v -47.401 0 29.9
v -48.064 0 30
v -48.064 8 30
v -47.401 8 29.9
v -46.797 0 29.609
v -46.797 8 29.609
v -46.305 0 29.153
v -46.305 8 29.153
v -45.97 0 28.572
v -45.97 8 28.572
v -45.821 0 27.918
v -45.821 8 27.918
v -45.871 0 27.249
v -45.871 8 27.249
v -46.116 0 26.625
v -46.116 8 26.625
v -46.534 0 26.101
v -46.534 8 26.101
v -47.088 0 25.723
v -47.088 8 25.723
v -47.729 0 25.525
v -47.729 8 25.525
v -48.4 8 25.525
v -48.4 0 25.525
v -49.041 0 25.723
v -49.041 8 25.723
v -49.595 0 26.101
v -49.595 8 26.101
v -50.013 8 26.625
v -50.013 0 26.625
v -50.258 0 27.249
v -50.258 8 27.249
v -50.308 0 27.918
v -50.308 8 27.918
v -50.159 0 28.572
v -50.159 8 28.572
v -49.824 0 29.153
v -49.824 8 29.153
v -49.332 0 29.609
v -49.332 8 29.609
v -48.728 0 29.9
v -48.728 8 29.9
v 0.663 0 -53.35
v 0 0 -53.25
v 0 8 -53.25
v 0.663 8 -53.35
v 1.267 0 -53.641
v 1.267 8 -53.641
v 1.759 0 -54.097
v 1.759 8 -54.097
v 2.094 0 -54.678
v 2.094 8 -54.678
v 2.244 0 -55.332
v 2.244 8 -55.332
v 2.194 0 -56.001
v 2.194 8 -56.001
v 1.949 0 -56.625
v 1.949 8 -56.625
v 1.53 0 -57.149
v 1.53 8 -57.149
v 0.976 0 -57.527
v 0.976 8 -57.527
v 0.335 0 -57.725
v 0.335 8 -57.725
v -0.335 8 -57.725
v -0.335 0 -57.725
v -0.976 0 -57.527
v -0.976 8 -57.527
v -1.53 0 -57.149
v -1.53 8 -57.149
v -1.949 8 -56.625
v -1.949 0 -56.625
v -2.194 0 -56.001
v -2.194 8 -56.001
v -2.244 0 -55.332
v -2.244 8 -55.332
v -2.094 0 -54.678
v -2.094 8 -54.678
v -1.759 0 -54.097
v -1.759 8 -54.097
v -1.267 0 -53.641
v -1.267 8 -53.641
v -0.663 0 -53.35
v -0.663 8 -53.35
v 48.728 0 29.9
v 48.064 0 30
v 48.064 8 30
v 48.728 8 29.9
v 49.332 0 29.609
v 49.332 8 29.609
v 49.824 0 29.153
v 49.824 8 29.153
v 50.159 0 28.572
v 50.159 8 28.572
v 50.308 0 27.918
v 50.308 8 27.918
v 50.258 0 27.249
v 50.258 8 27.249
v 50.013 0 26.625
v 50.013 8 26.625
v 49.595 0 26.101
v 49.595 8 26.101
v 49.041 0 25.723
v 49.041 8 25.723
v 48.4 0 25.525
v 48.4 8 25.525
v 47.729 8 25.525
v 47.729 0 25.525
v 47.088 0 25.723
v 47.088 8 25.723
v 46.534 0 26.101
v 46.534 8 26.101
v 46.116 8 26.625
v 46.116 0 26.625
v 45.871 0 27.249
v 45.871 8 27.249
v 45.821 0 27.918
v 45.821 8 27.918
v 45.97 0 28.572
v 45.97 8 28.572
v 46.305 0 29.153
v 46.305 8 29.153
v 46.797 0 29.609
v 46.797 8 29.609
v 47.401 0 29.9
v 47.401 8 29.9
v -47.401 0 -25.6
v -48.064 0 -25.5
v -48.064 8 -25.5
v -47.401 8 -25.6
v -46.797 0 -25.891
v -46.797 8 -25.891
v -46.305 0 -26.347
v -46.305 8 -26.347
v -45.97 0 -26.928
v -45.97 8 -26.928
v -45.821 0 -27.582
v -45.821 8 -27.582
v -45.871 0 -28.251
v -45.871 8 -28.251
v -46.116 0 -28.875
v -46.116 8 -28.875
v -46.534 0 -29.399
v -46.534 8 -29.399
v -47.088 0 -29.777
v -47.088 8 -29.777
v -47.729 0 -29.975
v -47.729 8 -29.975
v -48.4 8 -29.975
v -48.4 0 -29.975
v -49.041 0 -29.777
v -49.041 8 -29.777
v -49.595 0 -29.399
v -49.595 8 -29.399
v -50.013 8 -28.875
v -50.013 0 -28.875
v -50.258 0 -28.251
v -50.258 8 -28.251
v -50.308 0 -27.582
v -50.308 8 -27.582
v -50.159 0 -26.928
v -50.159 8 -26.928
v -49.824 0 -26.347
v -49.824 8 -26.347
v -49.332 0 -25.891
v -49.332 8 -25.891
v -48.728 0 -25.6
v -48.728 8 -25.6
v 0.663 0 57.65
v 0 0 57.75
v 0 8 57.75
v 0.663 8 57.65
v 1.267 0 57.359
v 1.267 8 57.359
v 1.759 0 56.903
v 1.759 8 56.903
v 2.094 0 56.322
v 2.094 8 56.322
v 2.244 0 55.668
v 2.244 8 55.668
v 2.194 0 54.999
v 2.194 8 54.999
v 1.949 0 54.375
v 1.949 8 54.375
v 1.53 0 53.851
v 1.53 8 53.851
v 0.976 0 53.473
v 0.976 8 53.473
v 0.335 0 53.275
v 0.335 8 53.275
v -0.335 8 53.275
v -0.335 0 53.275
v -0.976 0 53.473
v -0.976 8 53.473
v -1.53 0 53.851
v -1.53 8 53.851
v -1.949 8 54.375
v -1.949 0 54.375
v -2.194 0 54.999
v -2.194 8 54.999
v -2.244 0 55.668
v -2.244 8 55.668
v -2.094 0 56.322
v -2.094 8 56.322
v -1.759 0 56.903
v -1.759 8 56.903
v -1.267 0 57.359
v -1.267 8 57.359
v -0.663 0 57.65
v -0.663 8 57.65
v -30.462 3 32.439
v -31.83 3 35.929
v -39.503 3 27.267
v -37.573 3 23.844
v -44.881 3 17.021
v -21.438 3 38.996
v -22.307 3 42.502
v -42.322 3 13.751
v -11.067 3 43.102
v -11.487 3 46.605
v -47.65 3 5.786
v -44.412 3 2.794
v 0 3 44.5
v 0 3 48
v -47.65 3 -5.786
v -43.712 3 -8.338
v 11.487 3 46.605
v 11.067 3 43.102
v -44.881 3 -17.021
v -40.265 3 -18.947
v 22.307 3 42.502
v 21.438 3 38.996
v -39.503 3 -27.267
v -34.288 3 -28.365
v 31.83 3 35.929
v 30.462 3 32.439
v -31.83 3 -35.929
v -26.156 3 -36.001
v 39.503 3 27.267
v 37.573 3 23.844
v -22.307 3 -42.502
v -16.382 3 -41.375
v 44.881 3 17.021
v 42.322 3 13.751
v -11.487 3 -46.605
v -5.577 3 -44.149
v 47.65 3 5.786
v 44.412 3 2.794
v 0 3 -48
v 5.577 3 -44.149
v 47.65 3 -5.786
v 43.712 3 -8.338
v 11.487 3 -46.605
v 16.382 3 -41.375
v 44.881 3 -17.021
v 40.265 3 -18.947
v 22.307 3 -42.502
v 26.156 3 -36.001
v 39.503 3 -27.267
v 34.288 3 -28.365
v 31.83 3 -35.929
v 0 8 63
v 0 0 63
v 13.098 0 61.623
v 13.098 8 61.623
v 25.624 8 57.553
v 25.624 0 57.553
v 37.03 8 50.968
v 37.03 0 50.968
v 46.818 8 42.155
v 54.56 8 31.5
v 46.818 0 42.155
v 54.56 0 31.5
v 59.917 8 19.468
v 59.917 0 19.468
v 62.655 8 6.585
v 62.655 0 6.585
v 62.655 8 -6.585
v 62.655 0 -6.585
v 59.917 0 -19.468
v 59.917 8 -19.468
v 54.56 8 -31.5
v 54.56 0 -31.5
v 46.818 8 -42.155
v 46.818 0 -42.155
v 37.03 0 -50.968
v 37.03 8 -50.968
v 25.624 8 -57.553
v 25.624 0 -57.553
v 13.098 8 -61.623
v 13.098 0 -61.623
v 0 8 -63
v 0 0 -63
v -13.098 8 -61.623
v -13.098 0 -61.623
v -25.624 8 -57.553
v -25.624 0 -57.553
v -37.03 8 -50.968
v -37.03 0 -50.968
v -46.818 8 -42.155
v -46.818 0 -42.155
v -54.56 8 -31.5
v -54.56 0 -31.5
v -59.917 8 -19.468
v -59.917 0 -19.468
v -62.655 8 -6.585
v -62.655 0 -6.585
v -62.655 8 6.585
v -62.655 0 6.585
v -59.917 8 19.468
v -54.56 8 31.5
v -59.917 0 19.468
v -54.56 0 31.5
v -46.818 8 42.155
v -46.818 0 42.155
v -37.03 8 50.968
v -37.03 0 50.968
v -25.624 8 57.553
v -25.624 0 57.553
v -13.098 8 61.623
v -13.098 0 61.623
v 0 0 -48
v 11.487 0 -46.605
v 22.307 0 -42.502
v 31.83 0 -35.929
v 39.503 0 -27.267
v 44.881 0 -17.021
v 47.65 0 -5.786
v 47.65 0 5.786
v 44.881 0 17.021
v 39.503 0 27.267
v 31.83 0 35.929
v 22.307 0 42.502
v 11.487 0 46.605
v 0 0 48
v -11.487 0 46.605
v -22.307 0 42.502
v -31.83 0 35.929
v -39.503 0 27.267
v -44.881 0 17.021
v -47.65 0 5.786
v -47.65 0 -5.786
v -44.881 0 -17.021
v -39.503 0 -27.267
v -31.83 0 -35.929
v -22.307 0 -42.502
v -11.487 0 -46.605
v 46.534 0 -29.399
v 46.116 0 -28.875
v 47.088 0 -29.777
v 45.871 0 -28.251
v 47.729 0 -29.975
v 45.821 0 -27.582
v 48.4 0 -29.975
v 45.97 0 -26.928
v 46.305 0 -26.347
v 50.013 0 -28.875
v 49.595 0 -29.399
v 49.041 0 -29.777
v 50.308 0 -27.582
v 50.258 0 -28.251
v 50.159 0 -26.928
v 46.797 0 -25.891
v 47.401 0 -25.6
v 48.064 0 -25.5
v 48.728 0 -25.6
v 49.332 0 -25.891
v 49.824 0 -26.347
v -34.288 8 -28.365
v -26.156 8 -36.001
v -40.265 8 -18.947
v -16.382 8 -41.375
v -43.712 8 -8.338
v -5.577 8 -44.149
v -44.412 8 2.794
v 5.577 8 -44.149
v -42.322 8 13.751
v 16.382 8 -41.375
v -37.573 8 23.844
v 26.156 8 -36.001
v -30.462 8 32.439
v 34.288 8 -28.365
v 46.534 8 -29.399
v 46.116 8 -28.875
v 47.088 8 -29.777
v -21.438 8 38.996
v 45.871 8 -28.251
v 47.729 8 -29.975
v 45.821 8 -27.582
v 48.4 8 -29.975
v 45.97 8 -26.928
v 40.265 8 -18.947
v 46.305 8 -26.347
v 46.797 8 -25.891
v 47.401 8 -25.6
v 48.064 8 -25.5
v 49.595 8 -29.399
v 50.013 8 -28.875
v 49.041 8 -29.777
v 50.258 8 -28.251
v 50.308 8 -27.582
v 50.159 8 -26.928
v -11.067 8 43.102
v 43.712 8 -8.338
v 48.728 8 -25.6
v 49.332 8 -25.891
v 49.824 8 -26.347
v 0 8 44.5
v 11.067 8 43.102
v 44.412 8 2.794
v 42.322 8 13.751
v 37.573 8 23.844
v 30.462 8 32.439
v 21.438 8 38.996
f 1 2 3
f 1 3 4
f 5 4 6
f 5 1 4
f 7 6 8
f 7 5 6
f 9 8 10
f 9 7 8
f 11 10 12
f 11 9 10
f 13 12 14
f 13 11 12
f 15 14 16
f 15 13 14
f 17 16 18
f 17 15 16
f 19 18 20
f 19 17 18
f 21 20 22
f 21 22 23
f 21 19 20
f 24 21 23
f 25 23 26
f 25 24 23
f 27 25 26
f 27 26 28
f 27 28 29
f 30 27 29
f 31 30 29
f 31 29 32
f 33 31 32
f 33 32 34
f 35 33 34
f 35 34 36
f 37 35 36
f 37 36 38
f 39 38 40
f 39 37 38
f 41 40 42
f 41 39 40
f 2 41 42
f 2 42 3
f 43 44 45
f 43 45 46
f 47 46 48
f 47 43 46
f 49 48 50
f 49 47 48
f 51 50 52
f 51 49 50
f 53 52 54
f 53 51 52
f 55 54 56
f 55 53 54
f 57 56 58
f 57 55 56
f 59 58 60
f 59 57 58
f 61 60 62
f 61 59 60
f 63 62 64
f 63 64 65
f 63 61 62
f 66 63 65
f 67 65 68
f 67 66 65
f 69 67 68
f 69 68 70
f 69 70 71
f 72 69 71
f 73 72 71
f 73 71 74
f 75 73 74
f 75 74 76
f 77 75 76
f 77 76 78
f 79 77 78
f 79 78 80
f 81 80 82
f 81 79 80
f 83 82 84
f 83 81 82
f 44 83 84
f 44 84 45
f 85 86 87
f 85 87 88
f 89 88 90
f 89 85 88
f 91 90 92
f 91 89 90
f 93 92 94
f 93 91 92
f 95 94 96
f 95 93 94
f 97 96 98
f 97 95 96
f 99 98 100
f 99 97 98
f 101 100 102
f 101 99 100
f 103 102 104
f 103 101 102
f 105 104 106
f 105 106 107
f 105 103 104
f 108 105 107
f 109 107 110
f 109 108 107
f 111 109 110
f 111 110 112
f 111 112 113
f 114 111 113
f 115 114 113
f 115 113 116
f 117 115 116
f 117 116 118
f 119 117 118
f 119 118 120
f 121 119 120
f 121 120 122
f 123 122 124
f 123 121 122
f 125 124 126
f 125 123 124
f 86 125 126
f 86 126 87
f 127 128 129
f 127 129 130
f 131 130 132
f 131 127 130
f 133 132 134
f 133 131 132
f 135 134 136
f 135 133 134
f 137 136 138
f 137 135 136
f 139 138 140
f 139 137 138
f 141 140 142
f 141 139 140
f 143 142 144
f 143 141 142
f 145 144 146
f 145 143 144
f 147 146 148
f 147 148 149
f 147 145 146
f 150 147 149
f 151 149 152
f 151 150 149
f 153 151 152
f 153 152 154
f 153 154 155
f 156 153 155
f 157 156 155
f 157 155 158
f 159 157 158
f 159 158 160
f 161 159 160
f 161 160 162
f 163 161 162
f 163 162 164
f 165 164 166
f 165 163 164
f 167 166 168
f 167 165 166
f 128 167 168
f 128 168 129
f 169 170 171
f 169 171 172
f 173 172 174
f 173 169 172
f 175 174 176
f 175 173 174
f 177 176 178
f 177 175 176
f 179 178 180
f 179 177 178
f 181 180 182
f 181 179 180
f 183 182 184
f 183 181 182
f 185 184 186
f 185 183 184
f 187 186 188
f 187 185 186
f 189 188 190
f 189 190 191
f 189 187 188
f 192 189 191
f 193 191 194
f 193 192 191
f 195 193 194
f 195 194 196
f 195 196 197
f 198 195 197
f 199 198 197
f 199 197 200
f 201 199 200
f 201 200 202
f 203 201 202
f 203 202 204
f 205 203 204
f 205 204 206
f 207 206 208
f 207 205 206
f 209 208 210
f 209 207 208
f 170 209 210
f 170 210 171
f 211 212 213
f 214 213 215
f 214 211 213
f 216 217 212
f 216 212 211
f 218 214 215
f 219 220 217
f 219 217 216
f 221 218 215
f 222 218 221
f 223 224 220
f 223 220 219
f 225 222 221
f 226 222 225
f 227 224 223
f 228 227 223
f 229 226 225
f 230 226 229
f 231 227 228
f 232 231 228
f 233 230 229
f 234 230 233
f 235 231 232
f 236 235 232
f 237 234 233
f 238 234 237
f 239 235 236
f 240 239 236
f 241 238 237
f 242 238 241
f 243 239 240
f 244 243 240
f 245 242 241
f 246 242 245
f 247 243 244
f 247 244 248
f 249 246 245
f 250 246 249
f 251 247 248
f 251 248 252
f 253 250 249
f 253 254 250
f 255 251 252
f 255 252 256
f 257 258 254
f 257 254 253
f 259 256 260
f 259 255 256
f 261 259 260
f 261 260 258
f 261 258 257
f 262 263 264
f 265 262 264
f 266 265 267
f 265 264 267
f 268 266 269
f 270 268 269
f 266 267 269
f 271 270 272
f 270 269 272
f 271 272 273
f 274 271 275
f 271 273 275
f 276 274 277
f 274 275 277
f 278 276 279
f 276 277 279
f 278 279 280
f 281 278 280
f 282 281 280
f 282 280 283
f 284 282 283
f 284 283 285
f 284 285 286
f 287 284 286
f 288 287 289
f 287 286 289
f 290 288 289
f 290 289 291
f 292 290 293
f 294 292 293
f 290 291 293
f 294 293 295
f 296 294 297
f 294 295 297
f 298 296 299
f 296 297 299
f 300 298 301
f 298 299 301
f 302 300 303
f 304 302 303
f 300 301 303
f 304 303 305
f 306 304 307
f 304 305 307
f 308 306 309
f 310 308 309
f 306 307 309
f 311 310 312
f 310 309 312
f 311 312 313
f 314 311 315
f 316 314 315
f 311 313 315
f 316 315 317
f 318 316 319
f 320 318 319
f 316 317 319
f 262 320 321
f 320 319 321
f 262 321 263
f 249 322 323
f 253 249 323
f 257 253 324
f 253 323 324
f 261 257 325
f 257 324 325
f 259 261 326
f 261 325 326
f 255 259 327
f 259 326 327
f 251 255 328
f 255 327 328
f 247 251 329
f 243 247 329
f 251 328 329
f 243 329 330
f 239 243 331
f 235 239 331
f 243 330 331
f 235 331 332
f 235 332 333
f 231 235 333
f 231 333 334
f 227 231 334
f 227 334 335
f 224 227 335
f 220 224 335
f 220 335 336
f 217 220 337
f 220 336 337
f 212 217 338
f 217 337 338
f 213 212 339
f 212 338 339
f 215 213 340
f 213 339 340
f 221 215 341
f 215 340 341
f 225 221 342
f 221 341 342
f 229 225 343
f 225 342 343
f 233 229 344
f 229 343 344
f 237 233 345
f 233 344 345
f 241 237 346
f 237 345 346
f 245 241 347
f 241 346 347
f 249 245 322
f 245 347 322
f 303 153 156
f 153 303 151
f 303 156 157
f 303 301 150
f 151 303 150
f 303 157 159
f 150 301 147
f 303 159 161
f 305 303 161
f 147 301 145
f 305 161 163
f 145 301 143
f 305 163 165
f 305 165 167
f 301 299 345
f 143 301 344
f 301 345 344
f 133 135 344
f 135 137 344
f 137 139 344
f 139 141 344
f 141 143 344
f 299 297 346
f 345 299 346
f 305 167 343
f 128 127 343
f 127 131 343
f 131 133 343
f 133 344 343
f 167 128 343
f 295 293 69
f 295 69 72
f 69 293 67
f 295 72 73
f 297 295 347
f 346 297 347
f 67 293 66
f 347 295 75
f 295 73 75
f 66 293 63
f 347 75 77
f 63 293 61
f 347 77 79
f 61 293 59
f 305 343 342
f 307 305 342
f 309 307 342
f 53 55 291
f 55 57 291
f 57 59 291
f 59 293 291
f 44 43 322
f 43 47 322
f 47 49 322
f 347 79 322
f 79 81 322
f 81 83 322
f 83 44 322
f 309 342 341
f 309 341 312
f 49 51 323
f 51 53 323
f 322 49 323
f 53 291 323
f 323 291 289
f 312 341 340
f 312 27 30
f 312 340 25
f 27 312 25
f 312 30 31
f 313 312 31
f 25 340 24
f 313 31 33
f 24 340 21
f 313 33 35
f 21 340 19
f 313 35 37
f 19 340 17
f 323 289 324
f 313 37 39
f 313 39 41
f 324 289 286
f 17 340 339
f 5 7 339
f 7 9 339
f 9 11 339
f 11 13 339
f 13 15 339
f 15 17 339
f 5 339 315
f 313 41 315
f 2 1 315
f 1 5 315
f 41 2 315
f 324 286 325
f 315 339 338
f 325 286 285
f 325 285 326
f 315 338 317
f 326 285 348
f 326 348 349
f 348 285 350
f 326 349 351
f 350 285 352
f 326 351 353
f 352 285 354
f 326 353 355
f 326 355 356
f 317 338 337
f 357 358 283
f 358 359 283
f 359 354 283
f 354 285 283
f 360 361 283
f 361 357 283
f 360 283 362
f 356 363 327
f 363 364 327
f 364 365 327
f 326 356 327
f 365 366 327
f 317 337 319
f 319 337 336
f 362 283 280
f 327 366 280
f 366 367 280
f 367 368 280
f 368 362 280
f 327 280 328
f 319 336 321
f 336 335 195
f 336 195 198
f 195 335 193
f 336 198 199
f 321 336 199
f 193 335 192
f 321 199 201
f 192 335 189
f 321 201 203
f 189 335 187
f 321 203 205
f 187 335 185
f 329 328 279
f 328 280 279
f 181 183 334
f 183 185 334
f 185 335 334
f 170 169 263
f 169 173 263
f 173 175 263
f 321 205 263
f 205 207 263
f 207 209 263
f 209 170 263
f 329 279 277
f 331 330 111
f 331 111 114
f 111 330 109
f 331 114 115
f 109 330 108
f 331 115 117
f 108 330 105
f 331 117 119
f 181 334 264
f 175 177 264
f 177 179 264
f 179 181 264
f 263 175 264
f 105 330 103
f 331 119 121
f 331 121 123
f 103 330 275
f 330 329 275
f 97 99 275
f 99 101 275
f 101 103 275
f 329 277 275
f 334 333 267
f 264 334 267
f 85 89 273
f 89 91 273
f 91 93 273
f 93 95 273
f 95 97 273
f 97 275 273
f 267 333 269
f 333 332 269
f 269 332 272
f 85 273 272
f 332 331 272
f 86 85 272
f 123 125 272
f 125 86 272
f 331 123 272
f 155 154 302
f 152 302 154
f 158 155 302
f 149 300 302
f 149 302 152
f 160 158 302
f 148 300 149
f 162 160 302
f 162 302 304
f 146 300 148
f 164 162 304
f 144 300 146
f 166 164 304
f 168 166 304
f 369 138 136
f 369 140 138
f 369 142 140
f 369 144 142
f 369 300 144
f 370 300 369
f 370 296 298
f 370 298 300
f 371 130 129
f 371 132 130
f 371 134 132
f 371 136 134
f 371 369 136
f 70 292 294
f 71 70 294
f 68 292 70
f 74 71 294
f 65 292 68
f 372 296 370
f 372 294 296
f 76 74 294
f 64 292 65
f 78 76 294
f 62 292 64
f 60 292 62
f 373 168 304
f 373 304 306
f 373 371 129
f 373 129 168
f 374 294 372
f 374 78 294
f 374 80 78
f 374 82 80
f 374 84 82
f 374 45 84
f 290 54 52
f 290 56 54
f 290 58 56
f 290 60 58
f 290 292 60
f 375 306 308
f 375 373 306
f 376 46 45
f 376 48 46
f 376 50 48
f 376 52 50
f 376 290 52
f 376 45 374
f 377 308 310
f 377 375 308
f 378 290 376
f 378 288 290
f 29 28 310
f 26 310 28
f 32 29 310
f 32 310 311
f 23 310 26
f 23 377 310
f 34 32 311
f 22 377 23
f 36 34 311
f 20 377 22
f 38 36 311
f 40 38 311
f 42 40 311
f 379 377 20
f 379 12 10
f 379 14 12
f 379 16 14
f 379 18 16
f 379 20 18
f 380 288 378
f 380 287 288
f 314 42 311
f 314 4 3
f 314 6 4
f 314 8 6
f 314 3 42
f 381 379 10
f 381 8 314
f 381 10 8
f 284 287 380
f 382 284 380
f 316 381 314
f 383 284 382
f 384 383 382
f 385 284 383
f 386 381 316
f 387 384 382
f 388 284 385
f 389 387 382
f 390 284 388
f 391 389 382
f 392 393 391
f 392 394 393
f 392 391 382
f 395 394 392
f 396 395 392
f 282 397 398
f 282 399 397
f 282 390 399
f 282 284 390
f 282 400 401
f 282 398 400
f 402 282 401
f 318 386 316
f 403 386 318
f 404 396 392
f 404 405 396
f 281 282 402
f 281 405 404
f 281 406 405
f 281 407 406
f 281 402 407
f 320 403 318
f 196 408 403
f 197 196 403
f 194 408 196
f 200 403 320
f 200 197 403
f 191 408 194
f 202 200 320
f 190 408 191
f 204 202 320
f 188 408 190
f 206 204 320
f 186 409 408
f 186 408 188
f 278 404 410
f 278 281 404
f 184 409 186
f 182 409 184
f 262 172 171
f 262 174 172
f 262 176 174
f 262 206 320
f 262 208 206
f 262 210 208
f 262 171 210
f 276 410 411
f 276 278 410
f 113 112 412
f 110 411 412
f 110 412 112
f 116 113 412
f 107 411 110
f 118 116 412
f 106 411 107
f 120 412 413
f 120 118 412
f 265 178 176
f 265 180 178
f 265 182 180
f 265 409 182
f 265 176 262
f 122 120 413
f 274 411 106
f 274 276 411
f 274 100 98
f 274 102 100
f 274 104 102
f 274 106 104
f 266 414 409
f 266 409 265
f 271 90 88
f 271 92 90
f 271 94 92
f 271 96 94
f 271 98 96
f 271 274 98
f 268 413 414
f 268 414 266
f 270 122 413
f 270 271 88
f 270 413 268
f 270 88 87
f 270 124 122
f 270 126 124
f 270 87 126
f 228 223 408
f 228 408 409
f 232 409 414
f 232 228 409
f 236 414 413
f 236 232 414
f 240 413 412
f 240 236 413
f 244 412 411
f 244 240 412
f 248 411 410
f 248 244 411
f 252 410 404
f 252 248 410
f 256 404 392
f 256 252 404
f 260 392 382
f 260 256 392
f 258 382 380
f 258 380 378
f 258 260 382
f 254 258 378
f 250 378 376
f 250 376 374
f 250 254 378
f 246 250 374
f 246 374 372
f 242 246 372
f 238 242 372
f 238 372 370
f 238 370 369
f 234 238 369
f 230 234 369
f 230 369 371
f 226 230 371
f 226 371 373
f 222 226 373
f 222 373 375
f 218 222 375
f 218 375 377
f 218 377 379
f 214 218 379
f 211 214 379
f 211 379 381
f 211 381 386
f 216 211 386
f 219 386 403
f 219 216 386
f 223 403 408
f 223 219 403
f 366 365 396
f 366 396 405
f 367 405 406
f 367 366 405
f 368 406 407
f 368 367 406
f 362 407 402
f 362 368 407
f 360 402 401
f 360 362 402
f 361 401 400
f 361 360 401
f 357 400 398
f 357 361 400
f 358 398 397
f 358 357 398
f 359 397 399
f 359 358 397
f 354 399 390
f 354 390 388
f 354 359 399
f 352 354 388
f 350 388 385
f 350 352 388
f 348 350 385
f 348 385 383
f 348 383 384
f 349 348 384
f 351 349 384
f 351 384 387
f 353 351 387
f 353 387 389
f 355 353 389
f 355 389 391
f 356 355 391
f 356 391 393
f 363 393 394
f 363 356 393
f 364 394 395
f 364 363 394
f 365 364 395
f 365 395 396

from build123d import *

# Parameters (mm, degrees)
CROQUIS1_R              = 63
CROQUIS1_R_2            = 44.5
CROQUIS1_R_3            = 2.25
SALIENTE_EXTRUIR1_DEPTH = 8
CROQUIS2_R              = 48
CORTAR_EXTRUIR1_DEPTH   = 3


with BuildPart() as part:
    # Croquis1 → Saliente-Extruir1 (new body)
    with BuildSketch(Plane(origin=(0, 0, 0), x_dir=(1, 0, 0), z_dir=(0, 1, 0))):
        with Locations(Location((0, 0, 0), (0, 0, 270))):
            Circle(CROQUIS1_R)
        with Locations(Location((0, 0, 0), (0, 0, 270))):
            Circle(CROQUIS1_R_2, mode=Mode.SUBTRACT)
        with Locations(Location((0, 55.5, 0), (0, 0, 270))):
            Circle(CROQUIS1_R_3, mode=Mode.SUBTRACT)
        with Locations(Location((48.06440991, 27.75, 0), (0, 0, 270))):
            Circle(CROQUIS1_R_3, mode=Mode.SUBTRACT)
        with Locations(Location((48.06440991, -27.75, 0), (0, 0, 270))):
            Circle(CROQUIS1_R_3, mode=Mode.SUBTRACT)
        with Locations(Location((0, -55.5, 0), (0, 0, 270))):
            Circle(CROQUIS1_R_3, mode=Mode.SUBTRACT)
        with Locations(Location((-48.06440991, -27.75, 0), (0, 0, 270))):
            Circle(CROQUIS1_R_3, mode=Mode.SUBTRACT)
        with Locations(Location((-48.06440991, 27.75, 0), (0, 0, 270))):
            Circle(CROQUIS1_R_3, mode=Mode.SUBTRACT)
    extrude(amount=SALIENTE_EXTRUIR1_DEPTH)

    # Croquis2 → Cortar-Extruir1 (cut)
    with BuildSketch(Plane.XZ):
        with Locations(Location((0, 0, 0), (0, 0, 270))):
            Circle(CROQUIS2_R)
    extrude(amount=-CORTAR_EXTRUIR1_DEPTH, mode=Mode.SUBTRACT)


solid = part.part
